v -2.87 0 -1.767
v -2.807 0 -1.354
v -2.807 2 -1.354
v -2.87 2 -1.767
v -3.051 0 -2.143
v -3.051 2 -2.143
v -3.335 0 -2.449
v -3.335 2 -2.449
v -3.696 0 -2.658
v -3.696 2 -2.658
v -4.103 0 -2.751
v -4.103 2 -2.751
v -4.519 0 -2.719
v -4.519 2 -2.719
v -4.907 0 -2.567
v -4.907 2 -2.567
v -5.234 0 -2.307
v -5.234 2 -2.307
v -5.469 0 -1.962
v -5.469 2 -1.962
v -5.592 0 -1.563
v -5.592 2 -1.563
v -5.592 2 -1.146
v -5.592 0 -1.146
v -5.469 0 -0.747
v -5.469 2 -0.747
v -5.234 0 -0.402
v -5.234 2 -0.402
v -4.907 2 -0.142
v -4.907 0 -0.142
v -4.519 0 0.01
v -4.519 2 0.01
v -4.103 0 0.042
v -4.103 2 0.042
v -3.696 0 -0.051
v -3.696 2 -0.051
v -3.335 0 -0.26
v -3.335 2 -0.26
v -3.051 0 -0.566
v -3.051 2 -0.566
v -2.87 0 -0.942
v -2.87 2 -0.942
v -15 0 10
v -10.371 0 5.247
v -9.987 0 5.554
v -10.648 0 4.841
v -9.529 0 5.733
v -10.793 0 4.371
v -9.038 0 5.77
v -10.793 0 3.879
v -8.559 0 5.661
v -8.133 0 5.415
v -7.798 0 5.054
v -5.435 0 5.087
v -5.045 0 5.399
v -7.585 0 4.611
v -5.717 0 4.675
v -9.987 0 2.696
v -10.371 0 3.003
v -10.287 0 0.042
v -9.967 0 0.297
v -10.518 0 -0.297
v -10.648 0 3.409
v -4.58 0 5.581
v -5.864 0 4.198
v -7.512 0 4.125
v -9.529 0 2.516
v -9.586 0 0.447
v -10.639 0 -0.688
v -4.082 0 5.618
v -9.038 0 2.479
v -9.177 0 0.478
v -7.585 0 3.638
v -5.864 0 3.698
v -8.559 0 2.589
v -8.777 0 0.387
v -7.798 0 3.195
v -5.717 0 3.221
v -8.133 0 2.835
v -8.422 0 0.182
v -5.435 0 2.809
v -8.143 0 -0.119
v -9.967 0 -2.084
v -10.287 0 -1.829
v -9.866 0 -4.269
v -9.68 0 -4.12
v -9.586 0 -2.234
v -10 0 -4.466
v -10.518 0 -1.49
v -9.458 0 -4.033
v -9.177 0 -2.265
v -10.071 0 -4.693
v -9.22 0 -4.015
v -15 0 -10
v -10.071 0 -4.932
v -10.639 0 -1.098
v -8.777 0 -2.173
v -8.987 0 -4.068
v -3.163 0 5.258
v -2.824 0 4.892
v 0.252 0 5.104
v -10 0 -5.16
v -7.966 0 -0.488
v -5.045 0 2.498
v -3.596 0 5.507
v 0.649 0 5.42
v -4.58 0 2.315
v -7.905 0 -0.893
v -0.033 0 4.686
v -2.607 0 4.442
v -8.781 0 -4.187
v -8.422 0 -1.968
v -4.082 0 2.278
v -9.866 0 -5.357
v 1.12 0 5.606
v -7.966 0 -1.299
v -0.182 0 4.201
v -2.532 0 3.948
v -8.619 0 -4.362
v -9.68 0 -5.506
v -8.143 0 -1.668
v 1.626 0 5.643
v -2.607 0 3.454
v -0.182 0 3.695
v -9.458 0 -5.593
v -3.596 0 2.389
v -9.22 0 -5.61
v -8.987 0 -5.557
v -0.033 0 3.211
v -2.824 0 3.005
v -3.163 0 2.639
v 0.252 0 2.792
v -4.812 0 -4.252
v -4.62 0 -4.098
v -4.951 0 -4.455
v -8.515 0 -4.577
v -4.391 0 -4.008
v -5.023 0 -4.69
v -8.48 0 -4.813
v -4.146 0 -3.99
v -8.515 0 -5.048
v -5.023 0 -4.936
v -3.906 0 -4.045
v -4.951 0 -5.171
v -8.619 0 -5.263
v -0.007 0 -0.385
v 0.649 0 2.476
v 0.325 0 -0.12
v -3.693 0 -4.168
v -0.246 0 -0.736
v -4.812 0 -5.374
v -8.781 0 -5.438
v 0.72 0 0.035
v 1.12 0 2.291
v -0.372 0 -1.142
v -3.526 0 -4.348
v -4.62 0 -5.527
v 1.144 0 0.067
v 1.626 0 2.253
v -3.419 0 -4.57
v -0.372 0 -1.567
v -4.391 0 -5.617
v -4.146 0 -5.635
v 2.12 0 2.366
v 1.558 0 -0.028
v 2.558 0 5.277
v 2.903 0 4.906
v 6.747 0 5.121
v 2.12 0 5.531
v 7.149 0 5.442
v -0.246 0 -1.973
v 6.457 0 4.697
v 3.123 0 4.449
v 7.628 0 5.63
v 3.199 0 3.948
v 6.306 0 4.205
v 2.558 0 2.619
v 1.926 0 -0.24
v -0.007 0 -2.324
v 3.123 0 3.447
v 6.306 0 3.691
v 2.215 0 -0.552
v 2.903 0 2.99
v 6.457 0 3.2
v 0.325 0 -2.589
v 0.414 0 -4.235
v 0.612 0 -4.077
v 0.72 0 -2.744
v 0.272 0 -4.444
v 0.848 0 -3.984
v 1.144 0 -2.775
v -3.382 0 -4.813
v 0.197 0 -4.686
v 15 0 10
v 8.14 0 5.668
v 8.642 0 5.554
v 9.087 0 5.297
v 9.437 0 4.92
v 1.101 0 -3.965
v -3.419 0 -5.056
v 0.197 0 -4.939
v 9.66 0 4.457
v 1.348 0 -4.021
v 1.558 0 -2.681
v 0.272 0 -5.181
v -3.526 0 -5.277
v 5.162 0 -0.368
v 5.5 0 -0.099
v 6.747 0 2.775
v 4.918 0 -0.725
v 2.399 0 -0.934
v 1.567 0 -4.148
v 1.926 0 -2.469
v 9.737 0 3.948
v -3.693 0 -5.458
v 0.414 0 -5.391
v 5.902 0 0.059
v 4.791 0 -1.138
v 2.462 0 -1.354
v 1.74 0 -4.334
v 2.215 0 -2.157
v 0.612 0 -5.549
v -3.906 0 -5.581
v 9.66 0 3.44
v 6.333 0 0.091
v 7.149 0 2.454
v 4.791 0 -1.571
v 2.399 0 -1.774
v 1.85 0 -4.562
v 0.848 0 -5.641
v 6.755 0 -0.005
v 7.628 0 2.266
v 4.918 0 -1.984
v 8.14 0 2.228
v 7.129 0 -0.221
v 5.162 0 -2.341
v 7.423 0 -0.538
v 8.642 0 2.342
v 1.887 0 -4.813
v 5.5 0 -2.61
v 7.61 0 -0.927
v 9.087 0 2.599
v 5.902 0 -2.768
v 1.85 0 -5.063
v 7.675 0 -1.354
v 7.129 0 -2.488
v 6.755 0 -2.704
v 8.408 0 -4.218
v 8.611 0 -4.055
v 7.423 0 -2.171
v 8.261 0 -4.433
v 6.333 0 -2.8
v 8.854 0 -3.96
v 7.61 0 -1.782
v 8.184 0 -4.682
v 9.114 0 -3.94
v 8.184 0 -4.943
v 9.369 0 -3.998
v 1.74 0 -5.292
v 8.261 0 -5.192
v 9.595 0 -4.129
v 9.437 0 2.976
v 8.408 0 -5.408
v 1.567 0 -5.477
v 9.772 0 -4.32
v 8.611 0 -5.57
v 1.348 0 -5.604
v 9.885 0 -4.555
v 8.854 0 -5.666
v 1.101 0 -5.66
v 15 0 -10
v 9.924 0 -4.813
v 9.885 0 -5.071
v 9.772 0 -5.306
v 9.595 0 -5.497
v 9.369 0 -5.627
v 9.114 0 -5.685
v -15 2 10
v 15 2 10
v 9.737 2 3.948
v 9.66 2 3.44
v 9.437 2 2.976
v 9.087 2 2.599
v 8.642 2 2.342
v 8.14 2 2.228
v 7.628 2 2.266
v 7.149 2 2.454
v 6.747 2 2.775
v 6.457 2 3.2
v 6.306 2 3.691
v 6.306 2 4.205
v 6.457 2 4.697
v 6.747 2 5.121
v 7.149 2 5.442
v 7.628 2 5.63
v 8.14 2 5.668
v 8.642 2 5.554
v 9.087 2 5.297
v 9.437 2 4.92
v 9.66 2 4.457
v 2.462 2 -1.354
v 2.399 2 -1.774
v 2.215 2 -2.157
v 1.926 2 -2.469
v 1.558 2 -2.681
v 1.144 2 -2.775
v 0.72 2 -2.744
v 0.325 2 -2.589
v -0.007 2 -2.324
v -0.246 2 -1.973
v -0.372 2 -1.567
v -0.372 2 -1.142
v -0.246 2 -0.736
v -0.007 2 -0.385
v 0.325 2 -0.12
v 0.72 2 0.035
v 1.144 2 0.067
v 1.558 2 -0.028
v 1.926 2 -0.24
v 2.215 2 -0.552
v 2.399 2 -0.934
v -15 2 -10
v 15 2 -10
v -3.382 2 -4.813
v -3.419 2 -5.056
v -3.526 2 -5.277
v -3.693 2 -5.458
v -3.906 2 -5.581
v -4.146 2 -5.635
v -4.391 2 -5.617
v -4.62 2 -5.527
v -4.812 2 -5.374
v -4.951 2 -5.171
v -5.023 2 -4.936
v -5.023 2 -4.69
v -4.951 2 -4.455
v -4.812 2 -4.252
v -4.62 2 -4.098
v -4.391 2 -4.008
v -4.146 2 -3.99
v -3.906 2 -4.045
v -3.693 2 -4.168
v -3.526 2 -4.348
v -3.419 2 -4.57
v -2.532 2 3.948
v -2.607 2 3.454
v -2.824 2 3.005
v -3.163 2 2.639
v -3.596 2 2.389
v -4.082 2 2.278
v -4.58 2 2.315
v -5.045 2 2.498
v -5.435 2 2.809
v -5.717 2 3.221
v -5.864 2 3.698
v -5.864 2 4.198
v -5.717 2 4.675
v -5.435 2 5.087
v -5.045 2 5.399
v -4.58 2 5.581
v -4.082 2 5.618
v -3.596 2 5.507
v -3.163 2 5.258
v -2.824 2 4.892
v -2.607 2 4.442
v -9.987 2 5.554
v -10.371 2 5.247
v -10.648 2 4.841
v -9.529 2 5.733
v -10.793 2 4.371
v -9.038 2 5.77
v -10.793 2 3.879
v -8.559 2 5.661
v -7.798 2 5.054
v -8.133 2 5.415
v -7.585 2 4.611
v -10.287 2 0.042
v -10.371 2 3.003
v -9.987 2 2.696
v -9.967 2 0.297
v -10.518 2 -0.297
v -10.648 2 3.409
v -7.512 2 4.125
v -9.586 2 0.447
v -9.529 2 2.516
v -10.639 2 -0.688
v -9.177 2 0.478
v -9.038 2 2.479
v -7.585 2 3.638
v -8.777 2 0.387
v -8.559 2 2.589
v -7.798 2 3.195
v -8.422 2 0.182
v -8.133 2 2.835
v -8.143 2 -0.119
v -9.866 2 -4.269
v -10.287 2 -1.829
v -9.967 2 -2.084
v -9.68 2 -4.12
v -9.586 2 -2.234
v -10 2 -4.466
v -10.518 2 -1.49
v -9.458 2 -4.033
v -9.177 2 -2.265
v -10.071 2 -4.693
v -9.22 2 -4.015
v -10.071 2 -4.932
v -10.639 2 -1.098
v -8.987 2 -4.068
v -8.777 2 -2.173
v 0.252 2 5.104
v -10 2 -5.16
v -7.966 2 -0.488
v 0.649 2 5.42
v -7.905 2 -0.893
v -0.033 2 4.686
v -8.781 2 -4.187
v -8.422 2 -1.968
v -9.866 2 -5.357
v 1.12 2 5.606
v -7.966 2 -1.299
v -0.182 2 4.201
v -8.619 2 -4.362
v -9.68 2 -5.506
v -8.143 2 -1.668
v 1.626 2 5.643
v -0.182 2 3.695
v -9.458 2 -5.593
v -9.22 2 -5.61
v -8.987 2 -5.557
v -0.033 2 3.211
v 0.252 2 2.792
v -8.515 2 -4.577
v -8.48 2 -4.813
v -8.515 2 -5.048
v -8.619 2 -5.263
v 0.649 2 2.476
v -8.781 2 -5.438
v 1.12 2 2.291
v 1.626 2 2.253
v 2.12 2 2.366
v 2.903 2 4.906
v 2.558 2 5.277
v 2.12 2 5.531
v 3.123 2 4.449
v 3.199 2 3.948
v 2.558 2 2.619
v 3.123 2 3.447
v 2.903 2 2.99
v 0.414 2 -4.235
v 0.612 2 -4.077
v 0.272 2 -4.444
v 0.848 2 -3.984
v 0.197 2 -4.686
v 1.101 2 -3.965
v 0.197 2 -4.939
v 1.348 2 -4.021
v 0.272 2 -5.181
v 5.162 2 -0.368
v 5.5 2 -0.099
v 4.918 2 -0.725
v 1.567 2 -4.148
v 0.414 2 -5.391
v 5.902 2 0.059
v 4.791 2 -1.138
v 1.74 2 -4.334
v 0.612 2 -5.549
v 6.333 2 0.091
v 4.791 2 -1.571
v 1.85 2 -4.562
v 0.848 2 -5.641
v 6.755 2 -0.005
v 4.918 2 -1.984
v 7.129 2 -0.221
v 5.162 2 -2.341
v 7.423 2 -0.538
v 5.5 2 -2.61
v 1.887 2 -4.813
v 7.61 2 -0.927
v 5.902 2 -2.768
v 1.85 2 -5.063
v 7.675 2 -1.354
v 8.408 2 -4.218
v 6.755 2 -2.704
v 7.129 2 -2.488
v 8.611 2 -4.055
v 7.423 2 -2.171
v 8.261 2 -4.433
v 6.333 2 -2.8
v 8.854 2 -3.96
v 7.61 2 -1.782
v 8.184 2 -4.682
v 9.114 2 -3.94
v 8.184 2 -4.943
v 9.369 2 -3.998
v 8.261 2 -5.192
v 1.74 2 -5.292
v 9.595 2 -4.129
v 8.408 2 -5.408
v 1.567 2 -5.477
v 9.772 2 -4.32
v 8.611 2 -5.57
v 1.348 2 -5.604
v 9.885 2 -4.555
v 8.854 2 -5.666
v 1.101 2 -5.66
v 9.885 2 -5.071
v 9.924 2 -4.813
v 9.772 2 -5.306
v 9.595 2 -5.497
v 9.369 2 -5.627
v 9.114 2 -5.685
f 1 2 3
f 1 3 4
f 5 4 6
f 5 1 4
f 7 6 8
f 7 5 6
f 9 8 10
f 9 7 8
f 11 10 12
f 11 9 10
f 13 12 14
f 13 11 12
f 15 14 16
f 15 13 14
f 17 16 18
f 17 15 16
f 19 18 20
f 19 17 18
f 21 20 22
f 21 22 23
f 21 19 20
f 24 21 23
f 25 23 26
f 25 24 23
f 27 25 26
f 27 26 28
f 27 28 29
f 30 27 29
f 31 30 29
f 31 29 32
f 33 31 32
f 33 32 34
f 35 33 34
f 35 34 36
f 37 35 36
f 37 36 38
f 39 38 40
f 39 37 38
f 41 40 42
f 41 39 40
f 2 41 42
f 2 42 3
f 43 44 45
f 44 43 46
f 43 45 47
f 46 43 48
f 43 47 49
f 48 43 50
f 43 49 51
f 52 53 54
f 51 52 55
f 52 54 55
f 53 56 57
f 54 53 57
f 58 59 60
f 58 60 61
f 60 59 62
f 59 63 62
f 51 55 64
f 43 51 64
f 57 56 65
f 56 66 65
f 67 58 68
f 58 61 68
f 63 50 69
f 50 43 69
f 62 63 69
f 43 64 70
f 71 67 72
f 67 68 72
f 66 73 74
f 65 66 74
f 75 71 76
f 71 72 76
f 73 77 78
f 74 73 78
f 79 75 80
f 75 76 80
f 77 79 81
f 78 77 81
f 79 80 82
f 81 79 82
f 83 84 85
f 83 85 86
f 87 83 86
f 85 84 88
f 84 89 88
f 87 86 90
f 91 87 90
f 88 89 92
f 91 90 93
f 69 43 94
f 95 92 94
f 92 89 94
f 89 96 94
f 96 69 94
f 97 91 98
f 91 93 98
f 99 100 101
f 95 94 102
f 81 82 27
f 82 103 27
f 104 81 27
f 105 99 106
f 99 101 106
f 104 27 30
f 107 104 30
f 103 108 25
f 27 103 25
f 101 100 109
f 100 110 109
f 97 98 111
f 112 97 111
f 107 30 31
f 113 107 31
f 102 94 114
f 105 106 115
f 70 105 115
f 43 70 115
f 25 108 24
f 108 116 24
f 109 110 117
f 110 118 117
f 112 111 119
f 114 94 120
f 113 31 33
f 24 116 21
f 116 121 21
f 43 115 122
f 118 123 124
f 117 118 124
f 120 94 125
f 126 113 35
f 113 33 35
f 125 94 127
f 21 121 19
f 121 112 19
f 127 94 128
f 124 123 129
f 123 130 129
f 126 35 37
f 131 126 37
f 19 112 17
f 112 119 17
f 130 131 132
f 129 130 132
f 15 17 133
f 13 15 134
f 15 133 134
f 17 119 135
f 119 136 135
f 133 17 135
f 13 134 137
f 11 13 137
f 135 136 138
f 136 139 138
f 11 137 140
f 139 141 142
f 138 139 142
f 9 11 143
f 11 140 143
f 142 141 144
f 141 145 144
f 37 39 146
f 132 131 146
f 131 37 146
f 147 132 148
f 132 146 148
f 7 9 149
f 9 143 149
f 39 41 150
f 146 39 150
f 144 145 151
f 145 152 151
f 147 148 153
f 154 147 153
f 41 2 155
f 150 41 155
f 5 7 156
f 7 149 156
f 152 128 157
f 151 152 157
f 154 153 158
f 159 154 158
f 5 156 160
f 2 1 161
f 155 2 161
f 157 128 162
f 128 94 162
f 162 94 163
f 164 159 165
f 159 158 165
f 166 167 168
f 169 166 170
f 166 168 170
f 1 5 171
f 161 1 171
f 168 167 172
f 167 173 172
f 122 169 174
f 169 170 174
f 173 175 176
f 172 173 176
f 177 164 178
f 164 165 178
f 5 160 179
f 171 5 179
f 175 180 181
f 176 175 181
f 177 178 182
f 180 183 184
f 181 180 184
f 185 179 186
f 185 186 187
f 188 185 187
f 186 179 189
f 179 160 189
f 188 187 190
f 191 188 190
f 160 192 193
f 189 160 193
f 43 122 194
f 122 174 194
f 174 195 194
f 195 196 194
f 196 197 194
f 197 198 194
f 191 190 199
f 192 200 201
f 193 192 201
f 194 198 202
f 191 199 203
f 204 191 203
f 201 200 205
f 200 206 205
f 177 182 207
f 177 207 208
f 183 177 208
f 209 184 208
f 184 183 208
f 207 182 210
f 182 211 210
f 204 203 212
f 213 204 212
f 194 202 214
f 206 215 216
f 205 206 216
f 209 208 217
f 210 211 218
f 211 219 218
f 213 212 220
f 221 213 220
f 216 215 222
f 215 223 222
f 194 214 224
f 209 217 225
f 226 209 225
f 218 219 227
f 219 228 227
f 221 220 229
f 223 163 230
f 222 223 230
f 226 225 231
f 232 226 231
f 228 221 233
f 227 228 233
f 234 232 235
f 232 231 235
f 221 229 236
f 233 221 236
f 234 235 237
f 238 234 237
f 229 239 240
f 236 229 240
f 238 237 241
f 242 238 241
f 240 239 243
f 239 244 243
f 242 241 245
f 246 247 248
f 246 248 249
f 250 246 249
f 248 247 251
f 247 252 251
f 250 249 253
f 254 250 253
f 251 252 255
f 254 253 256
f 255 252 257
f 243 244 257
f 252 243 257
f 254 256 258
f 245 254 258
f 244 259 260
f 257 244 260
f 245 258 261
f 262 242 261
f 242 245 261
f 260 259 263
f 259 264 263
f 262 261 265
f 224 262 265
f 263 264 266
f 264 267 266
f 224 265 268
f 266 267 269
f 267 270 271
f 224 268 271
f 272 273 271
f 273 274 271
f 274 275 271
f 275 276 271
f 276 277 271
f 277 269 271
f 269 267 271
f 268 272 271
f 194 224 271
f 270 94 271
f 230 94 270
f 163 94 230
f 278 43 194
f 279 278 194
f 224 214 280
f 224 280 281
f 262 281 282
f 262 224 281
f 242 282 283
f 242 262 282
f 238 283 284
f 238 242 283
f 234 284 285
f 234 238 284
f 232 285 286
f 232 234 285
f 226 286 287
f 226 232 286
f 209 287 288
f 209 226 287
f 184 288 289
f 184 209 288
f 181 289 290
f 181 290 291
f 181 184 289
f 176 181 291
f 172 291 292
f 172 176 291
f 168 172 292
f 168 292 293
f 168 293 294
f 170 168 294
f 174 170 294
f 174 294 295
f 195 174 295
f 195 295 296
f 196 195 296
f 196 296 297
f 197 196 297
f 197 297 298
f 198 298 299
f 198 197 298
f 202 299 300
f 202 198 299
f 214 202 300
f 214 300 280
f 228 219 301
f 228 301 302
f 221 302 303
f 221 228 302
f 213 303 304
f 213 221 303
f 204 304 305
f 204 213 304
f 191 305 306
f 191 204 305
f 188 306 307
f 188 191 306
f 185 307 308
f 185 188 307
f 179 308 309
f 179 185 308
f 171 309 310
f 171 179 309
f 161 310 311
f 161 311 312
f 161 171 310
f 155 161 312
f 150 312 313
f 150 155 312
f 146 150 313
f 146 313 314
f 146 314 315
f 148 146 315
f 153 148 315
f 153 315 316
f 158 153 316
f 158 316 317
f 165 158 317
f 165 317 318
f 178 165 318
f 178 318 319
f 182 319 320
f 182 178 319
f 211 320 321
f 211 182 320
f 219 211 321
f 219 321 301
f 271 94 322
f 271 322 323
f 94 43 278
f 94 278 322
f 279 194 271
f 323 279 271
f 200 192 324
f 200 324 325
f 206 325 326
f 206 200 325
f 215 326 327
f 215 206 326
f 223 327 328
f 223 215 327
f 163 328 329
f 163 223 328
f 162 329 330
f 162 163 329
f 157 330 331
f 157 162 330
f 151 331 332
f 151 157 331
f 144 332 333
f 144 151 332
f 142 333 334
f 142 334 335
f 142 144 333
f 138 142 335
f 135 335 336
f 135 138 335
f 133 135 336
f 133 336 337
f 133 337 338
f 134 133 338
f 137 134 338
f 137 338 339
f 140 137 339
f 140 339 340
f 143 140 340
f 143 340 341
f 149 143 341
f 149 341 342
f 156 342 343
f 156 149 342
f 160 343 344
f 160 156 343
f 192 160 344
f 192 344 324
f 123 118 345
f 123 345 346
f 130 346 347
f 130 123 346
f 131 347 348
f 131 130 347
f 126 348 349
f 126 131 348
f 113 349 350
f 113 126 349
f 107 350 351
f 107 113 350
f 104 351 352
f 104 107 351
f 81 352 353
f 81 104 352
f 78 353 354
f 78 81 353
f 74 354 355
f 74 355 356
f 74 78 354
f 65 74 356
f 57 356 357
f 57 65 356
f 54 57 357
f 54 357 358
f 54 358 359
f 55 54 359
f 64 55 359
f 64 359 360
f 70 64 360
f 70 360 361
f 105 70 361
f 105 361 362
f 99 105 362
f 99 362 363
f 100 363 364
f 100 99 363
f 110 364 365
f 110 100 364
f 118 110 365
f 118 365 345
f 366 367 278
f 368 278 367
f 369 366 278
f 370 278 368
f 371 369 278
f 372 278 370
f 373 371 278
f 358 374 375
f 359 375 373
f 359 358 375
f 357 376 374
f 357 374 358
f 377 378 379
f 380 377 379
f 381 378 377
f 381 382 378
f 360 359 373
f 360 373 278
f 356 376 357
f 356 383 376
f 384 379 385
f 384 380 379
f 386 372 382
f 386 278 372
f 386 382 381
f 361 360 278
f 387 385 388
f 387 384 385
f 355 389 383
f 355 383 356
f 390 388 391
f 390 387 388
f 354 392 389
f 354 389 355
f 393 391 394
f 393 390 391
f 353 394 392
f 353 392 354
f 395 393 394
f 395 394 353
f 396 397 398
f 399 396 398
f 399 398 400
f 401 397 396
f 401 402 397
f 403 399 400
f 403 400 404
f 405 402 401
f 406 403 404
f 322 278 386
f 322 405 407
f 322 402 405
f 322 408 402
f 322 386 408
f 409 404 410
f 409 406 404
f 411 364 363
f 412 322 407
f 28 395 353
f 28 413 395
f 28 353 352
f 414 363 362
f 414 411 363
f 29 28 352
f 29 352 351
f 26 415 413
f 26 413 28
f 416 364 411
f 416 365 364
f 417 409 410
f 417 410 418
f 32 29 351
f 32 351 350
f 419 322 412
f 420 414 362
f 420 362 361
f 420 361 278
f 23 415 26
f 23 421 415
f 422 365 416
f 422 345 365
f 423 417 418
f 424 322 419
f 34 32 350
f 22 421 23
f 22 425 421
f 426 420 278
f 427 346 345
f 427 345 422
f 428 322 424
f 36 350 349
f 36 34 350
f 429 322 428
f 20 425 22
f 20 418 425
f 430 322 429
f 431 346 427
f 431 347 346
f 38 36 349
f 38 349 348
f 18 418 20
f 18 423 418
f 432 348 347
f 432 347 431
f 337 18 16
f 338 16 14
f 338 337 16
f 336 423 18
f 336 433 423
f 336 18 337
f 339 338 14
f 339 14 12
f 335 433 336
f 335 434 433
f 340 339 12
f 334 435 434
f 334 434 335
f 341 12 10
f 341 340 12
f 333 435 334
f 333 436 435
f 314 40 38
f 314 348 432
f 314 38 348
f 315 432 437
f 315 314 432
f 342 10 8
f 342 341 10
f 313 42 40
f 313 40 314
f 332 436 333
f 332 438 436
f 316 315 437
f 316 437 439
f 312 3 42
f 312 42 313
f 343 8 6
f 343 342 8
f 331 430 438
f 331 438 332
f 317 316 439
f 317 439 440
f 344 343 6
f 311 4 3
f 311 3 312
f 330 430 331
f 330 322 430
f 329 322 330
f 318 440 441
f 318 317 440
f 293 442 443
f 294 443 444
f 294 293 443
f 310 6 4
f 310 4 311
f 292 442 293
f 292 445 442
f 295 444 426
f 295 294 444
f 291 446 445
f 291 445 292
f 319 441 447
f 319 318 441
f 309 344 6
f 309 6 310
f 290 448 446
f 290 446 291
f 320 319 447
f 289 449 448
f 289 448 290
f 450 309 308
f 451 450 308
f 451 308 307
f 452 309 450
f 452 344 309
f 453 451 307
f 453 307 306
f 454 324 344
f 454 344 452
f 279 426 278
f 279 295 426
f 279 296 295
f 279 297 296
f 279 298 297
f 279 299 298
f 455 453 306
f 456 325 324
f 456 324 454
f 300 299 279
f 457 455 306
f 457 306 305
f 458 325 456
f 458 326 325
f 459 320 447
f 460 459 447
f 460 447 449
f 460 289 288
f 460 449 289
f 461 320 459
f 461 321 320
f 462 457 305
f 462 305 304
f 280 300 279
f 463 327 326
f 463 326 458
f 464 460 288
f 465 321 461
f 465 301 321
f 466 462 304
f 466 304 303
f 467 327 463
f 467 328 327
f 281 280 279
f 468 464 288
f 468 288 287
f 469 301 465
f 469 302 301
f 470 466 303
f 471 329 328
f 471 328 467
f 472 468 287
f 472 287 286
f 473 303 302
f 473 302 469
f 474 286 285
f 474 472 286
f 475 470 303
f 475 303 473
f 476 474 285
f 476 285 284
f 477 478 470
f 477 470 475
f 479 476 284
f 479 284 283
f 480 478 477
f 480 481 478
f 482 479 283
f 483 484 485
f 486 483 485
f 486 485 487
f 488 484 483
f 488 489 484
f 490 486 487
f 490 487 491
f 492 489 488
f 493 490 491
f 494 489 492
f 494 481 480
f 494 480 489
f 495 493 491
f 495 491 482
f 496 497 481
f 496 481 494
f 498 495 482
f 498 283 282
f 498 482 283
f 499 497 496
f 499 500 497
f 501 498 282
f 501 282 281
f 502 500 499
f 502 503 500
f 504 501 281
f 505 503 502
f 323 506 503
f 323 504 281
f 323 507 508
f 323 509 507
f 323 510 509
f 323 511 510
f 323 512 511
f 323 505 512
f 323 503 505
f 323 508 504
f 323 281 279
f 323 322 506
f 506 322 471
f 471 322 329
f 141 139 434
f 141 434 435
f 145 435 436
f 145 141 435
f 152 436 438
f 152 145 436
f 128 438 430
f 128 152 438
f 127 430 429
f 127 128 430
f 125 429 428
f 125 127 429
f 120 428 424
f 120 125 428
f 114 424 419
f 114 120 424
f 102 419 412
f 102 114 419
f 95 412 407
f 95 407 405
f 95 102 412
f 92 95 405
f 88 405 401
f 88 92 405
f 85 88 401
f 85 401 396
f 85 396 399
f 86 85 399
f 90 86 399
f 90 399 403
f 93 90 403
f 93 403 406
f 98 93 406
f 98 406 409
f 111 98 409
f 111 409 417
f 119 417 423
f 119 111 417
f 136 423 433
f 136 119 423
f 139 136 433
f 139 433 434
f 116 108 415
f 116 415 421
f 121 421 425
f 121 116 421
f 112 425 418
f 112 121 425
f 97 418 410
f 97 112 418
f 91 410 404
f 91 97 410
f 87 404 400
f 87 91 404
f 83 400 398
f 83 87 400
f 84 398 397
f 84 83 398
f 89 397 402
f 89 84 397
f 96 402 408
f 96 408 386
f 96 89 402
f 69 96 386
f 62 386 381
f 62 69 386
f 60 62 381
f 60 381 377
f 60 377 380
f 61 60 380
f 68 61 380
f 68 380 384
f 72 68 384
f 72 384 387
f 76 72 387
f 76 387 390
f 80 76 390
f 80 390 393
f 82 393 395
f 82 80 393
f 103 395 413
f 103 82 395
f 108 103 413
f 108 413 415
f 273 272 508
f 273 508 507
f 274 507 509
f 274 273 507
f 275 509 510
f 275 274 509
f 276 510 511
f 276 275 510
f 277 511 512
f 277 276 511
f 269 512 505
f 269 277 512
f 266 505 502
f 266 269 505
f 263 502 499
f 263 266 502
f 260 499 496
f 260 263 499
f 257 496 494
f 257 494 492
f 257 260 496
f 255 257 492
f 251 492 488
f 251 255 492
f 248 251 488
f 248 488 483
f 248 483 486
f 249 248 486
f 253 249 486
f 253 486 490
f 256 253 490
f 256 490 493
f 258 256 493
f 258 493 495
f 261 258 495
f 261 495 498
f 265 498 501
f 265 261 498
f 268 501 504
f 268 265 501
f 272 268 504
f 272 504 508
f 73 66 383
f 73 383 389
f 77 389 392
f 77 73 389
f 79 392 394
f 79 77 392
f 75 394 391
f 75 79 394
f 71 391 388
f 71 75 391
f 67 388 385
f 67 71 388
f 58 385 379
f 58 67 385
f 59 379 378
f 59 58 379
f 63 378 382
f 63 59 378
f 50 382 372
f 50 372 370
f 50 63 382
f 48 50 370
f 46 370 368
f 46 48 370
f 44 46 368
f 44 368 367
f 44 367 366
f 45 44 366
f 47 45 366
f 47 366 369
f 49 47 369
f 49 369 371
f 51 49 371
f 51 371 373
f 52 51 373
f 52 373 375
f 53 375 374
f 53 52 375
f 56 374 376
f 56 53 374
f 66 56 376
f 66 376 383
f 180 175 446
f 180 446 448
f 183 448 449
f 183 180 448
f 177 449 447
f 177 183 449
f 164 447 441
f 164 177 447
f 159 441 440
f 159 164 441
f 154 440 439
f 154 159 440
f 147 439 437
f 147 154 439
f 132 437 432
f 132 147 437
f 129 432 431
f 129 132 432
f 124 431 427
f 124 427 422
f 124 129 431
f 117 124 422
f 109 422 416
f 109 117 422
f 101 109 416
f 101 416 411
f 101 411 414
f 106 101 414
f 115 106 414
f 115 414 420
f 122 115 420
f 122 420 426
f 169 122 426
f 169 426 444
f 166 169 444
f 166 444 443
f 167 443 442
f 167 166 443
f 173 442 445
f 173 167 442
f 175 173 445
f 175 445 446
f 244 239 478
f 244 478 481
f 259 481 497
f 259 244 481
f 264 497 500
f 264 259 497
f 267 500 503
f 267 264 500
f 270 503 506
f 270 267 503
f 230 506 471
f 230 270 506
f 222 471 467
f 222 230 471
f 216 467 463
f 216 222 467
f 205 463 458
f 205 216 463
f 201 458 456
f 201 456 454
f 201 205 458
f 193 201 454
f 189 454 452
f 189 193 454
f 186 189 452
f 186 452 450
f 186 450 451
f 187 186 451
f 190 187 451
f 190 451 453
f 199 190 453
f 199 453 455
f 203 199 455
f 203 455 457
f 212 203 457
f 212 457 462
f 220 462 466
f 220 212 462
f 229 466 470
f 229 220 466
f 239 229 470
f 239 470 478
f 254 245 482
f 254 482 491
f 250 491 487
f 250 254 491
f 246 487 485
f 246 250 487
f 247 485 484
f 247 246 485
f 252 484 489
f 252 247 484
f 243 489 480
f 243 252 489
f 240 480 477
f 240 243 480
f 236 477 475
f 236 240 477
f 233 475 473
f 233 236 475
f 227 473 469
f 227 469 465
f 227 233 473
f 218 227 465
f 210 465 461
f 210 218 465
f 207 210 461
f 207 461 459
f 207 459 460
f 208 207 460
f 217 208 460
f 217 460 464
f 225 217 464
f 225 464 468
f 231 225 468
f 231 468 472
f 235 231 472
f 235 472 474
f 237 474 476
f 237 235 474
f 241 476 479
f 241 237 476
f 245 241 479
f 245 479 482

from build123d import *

# Parameters (mm, degrees)
SKETCH_1_W      = 30
SKETCH_1_H      = 20
SKETCH_1_R      = 0.8
SKETCH_1_R_2    = 0.825
SKETCH_1_R_3    = 0.85
SKETCH_1_R_4    = 0.875
SKETCH_1_R_5    = 1.375
SKETCH_1_R_6    = 1.4
SKETCH_1_R_7    = 1.425
SKETCH_1_R_8    = 1.45
SKETCH_1_R_9    = 1.65
SKETCH_1_R_10   = 1.675
SKETCH_1_R_11   = 1.7
SKETCH_1_R_12   = 1.725
EXTRUDE_1_DEPTH = 2


with BuildPart() as part:
    # 草图1 → 凸台-拉伸1 (new body)
    with BuildSketch(Plane(origin=(0, 0, 0), x_dir=(1, 0, 0), z_dir=(0, 1, 0))):
        Rectangle(SKETCH_1_W, SKETCH_1_H)
        with Locations((-9.279538905, 4.812680115)):
            Circle(SKETCH_1_R, mode=Mode.SUBTRACT)
        with Locations((-4.207492795, 4.812680115)):
            Circle(SKETCH_1_R_2, mode=Mode.SUBTRACT)
        with Locations((1.037463977, 4.812680115)):
            Circle(SKETCH_1_R_3, mode=Mode.SUBTRACT)
        with Locations((9.048991354, 4.812680115)):
            Circle(SKETCH_1_R_4, mode=Mode.SUBTRACT)
        with Locations((-9.279538905, 0.893371758)):
            Circle(SKETCH_1_R_5, mode=Mode.SUBTRACT)
        with Locations((-4.207492795, 1.354466859)):
            Circle(SKETCH_1_R_6, mode=Mode.SUBTRACT)
        with Locations((1.037463977, 1.354466859)):
            Circle(SKETCH_1_R_7, mode=Mode.SUBTRACT)
        with Locations((6.224783862, 1.354466859)):
            Circle(SKETCH_1_R_8, mode=Mode.SUBTRACT)
        with Locations((-9.161763858, -4.124789371)):
            Circle(SKETCH_1_R_9, mode=Mode.SUBTRACT)
        with Locations((-4.207492795, -3.948126801)):
            Circle(SKETCH_1_R_10, mode=Mode.SUBTRACT)
        with Locations((1.498559078, -3.948126801)):
            Circle(SKETCH_1_R_11, mode=Mode.SUBTRACT)
        with Locations((8.011527378, -3.948126801)):
            Circle(SKETCH_1_R_12, mode=Mode.SUBTRACT)
    extrude(amount=EXTRUDE_1_DEPTH)


solid = part.part
